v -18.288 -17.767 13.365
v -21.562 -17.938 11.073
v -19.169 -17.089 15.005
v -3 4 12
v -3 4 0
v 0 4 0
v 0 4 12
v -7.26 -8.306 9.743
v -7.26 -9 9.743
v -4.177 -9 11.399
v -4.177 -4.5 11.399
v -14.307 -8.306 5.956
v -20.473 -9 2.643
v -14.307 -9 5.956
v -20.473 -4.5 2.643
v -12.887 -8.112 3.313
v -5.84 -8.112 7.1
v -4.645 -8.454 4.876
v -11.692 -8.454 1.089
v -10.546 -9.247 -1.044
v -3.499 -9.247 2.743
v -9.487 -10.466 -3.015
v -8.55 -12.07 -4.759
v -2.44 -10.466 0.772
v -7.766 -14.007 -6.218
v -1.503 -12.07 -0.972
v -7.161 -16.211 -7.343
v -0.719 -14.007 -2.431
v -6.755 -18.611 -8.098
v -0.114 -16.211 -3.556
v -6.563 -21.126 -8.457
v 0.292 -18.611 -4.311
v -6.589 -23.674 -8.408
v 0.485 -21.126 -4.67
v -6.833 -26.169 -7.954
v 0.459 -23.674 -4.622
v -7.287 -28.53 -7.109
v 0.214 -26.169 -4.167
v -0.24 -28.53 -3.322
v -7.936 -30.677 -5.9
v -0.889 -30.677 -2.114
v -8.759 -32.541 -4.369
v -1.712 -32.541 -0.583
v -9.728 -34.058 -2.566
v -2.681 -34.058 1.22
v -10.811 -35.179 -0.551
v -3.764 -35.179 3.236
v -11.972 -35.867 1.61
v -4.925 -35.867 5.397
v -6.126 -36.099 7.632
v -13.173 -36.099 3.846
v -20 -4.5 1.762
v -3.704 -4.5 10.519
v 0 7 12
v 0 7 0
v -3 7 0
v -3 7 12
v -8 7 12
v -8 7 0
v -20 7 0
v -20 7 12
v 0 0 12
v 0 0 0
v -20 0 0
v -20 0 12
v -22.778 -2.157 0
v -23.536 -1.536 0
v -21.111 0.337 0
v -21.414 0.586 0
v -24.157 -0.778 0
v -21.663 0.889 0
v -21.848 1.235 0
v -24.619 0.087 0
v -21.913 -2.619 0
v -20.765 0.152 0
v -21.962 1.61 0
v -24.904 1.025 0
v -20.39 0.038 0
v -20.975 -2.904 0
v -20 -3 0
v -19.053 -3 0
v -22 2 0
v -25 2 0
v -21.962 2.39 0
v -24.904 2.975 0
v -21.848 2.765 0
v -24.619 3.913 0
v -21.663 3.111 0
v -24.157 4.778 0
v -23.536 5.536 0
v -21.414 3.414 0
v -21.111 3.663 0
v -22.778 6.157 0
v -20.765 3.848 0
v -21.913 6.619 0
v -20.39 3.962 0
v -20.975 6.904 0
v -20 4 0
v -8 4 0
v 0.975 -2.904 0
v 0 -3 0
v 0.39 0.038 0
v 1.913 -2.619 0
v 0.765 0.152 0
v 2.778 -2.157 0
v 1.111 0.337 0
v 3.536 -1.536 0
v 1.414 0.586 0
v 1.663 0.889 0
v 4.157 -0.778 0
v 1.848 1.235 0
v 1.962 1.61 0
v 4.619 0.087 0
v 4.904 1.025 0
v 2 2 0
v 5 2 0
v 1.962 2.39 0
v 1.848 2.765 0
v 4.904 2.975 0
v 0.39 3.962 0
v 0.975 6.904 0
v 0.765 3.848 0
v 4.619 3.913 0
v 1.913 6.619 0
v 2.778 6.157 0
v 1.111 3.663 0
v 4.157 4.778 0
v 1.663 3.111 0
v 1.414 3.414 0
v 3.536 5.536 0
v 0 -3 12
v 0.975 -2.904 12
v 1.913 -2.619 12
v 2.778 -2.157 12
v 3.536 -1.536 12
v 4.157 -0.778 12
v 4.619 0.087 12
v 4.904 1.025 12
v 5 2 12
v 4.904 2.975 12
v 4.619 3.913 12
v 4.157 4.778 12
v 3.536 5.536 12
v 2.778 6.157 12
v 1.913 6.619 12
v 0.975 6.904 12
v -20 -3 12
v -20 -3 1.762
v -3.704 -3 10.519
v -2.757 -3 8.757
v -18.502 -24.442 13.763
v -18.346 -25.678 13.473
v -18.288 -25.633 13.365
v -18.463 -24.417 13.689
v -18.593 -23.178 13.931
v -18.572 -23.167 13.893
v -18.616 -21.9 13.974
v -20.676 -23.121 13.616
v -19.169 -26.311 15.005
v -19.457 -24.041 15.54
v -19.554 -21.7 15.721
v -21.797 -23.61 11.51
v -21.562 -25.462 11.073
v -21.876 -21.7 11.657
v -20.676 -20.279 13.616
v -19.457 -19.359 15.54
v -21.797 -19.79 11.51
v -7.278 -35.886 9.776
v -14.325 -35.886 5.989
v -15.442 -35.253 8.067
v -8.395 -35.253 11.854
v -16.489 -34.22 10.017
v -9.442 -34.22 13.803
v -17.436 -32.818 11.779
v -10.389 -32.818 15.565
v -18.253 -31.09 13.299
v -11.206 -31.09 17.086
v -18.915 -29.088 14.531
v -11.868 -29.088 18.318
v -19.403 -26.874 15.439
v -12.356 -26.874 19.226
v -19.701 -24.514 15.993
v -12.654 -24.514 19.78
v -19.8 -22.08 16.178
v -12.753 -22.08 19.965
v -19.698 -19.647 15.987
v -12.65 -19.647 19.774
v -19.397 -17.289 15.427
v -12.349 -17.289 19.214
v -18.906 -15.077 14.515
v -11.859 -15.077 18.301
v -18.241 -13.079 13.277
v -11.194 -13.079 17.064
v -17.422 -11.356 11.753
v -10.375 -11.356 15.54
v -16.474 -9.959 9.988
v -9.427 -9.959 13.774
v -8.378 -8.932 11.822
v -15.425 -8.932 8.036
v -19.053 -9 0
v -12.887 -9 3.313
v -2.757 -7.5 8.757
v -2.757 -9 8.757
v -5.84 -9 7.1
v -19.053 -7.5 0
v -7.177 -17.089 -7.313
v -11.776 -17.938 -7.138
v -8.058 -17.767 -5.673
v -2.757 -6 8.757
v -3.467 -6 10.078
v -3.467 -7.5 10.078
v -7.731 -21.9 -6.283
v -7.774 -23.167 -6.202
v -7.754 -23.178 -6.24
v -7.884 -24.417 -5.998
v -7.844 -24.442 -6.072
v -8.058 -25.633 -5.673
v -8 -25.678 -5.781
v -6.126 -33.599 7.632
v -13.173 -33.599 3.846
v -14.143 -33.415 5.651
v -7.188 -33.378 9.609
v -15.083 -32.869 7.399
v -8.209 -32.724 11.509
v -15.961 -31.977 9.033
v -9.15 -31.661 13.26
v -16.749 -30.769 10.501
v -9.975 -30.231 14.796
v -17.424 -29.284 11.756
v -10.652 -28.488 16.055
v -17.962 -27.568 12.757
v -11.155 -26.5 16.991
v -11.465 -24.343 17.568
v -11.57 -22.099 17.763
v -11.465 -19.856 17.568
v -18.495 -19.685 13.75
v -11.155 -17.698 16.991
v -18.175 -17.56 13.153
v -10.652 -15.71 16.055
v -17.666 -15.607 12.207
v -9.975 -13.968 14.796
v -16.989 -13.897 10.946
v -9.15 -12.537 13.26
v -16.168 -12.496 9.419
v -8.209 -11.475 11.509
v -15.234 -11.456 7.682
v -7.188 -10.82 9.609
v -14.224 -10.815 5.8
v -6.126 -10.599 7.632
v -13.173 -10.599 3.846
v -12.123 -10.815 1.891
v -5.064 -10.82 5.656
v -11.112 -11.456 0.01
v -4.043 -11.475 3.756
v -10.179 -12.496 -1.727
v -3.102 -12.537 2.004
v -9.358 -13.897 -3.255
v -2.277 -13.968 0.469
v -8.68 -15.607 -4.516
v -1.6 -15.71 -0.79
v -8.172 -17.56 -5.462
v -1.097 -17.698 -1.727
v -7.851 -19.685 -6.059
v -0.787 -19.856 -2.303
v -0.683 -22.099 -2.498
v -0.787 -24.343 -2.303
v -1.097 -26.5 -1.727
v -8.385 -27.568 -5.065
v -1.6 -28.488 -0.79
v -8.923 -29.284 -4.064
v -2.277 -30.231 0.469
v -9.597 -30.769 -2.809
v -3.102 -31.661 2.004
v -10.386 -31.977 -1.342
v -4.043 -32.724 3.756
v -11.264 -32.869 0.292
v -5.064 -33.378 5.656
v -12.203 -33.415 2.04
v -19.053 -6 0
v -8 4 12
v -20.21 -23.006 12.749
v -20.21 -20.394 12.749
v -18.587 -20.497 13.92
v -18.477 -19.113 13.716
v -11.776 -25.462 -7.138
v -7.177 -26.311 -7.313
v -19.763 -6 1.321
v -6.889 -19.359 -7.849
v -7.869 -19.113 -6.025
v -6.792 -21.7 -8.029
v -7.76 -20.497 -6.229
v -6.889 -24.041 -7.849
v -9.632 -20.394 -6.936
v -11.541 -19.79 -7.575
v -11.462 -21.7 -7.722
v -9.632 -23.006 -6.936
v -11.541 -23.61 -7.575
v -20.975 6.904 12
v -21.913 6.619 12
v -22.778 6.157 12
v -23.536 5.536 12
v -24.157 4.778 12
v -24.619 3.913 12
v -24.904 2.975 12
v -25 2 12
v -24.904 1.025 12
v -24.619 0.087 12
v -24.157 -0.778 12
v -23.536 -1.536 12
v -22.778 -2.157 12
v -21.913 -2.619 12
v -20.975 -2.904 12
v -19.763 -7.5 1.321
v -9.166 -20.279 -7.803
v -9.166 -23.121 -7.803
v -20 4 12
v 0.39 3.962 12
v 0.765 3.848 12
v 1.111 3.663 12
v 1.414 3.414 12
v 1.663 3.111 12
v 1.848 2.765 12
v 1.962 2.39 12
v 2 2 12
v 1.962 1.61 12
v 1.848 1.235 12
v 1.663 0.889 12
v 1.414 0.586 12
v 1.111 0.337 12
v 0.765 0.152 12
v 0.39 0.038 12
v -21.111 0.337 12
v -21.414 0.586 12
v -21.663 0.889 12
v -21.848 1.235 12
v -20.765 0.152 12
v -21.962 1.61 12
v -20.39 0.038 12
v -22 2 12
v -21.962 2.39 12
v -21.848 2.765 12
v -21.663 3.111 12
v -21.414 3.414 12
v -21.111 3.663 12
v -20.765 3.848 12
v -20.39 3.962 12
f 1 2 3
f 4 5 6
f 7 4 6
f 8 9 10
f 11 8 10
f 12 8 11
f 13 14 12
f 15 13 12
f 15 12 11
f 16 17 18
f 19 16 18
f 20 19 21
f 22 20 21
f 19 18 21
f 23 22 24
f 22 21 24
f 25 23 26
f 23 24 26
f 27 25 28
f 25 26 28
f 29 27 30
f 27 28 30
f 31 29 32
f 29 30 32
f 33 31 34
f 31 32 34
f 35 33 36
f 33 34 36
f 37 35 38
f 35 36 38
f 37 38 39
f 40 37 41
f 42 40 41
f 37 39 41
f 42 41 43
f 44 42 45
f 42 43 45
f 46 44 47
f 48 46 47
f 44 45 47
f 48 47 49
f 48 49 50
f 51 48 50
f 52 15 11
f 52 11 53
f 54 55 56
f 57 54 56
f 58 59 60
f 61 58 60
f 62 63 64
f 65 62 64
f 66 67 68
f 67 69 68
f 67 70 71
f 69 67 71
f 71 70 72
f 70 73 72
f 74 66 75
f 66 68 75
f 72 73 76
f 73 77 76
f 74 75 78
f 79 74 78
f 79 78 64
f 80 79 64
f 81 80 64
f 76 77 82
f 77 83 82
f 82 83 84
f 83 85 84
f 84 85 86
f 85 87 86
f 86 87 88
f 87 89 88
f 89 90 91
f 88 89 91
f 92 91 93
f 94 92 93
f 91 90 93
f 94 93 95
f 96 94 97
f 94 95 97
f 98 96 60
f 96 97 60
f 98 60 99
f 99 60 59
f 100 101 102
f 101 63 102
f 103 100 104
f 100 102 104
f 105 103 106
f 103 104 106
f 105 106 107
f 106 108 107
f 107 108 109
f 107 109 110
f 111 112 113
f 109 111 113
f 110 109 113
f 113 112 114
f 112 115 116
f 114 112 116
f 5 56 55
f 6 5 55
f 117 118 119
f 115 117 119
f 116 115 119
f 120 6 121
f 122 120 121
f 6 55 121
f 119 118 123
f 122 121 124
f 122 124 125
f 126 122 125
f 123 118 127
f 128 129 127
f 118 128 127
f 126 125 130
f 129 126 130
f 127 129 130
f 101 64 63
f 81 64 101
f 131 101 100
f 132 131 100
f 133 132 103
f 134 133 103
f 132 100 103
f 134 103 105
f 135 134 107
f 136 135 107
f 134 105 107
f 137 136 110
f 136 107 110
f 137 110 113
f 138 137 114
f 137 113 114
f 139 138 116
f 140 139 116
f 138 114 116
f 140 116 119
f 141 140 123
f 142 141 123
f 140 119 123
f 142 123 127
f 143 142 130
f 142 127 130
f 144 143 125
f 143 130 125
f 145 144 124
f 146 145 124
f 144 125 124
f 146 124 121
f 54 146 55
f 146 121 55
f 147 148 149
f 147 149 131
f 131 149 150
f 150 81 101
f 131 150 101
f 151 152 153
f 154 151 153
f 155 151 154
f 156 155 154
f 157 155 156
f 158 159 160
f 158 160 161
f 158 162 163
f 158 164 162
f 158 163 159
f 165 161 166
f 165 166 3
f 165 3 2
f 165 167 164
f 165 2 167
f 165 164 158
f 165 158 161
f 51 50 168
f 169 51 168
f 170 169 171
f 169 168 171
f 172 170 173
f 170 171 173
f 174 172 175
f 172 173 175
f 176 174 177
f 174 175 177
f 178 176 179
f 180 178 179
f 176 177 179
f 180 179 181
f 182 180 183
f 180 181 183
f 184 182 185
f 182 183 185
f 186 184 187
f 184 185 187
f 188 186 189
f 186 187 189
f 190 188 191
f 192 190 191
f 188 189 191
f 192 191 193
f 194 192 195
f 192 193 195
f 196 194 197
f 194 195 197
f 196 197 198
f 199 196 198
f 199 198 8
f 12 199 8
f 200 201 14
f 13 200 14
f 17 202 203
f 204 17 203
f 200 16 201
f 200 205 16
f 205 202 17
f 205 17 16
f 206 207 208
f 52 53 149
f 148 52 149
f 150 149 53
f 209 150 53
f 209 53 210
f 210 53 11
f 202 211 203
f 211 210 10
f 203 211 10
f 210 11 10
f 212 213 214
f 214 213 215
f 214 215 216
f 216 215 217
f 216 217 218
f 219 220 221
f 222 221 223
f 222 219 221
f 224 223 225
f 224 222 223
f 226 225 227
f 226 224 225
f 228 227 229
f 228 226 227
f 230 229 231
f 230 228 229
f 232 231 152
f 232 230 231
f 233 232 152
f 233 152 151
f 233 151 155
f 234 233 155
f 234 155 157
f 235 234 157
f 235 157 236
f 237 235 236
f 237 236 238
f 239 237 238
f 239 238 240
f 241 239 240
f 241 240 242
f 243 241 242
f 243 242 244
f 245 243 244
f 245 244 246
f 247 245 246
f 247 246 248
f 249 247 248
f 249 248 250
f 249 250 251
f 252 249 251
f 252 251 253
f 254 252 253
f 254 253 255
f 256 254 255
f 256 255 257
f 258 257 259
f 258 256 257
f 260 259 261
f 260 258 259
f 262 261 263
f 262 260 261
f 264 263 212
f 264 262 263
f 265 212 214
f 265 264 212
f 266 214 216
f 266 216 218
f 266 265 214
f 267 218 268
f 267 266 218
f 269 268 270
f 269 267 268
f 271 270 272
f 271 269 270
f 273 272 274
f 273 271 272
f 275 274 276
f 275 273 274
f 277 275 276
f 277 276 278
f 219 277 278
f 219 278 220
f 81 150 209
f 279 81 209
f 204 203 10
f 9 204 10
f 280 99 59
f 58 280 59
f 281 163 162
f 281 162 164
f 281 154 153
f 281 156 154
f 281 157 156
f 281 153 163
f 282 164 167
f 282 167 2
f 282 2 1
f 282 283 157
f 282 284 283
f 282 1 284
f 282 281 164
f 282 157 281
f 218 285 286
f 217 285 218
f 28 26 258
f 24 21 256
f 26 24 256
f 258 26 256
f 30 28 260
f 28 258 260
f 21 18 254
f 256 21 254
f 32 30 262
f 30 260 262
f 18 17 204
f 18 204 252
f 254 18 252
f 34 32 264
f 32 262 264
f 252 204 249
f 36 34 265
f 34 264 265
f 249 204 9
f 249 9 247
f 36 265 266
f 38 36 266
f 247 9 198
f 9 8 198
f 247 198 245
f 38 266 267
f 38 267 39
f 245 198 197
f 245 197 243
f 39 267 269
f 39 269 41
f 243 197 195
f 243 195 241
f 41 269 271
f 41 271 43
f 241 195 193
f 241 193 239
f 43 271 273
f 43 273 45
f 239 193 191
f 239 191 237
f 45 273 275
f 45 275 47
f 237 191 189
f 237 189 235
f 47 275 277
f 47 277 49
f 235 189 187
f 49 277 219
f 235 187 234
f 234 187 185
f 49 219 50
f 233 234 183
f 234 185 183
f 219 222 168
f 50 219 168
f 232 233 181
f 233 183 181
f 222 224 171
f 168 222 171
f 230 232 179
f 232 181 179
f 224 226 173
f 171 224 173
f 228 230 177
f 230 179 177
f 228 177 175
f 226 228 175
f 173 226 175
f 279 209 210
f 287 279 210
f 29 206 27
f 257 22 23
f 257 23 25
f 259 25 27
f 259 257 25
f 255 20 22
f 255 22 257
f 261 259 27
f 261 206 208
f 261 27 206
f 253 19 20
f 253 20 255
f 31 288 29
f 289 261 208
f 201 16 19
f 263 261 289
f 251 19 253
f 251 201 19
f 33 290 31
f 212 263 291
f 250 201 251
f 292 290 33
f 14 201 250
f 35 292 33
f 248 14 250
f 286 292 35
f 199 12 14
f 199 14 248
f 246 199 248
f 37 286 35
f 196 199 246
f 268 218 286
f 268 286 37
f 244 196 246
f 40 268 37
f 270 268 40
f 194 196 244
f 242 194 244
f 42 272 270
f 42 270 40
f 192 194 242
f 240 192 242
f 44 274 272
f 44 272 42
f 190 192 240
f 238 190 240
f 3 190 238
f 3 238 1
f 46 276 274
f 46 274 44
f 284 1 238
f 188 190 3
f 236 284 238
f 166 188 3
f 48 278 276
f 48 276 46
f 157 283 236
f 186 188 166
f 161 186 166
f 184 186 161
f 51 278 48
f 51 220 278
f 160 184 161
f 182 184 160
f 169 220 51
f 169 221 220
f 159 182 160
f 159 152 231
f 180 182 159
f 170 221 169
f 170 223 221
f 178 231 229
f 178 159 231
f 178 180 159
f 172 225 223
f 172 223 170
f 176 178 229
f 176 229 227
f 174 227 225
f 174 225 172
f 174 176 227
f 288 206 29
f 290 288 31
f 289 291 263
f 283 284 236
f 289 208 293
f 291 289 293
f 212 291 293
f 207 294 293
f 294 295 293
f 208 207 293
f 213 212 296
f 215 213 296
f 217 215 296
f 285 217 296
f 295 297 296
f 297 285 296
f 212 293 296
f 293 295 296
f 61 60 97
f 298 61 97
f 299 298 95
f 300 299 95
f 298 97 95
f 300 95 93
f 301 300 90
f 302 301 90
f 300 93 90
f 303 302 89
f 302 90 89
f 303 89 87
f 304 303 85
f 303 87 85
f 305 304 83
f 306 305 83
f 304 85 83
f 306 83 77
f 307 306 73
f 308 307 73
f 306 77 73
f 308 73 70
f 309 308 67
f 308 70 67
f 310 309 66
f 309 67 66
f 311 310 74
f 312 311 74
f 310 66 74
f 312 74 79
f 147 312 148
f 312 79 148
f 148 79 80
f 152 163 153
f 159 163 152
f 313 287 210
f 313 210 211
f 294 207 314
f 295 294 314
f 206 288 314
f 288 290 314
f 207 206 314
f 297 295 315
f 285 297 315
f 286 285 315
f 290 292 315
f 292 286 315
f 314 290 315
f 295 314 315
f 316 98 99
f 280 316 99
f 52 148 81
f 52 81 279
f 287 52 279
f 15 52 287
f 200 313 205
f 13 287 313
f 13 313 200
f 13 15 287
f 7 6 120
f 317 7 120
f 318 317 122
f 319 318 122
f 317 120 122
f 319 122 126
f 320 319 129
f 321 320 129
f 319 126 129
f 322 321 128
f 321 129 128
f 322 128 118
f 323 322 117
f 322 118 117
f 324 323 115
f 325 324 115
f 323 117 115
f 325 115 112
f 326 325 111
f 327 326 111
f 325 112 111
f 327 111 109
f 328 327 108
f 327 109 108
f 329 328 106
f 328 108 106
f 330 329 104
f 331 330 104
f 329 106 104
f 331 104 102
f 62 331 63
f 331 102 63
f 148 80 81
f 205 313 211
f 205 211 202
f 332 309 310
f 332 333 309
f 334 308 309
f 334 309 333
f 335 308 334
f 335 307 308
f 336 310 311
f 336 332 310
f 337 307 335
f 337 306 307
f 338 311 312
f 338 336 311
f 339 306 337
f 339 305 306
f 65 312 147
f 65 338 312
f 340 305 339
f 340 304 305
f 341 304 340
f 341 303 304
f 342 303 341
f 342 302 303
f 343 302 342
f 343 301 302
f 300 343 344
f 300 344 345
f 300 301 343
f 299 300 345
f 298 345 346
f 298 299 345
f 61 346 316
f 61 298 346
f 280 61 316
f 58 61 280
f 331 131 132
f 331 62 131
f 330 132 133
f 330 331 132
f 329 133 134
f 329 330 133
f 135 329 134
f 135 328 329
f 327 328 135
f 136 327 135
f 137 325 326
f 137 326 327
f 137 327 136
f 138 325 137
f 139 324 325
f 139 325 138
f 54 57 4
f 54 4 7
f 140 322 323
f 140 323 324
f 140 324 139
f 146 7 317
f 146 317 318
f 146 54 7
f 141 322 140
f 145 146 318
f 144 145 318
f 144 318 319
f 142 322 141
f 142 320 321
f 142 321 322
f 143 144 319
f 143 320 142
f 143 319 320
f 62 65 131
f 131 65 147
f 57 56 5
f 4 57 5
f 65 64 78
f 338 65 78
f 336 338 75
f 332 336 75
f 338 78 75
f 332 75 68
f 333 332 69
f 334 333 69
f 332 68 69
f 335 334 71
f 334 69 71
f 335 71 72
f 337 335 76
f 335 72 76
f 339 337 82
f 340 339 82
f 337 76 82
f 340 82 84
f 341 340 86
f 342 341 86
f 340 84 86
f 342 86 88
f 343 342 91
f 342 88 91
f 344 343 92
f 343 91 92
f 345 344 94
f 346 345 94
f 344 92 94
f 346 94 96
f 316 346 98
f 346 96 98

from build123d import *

# Parameters (mm, degrees)
F1_DEPTH       = 12
F5_DEPTH       = 18.5
F7_R           = 11.5
F8_DEPTH       = 8
F11_ANGLE_BACK = 20
F11_ANGLE      = 40


with BuildPart() as f1:
    # F0 (on Top) → F1 (new body)
    with BuildSketch(Plane.XY):
        with BuildLine():
            Line((0, 0), (-20, 0))
            ThreePointArc((-20, 0), (-22, 2), (-20, 4))
            Line((-20, 4), (-8, 4))
            Line((-8, 4), (-8, 7))
            Line((-8, 7), (-20, 7))
            ThreePointArc((-20, 7), (-25, 2), (-20, -3))
            Line((-20, -3), (0, -3))
            ThreePointArc((0, -3), (5, 2), (0, 7))
            Line((0, 7), (-3, 7))
            Line((-3, 7), (-3, 4))
            Line((-3, 4), (0, 4))
            ThreePointArc((0, 4), (2, 2), (0, 0))
        make_face()
    extrude(amount=F1_DEPTH)

    # F4 (on line) → F5 (join)
    with BuildSketch(Plane(origin=(-14.7844431916, 0, -7.9443702008), x_dir=(0, -1, 0), z_dir=(-0.8808807435, 0, -0.4733382677))):
        Polygon((3, 11.0186671228), (3, 9.0186671228), (6, 9.0186671228), (6, 10.5186671228), (7.5, 10.5186671228), (7.5, 9.0186671228), (9, 9.0186671228), (9, 12.0186671228), (4.5, 12.0186671228), (4.5, 11.0186671228), align=None)
    extrude(amount=-F5_DEPTH)

    # F7 (on offset) → F8 (join)
    with BuildSketch(Plane(origin=(-1.5712320387, 0, -0.8442961852), x_dir=(0, -1, 0), z_dir=(-0.8808807435, 0, -0.4733382677))):
        with BuildLine():
            ThreePointArc((36.0992396533, 9.6230288318), (24.609219733, 23.3961911411), (8.9992396533, 14.5616521217))
            Line((8.9992396533, 14.5616521217), (8.9992396533, 4.6844055418))
            ThreePointArc((8.9992396533, 4.6844055418), (24.609219733, -4.1501334776), (36.0992396533, 9.6230288318))
        make_face()
        with Locations((22.0992396533, 9.6230288318)):
            Circle(F7_R, mode=Mode.SUBTRACT)
        with BuildLine():
            Line((8.9992396533, 4.6844055418), (8.9992396533, 14.5616521217))
            ThreePointArc((8.9992396533, 14.5616521217), (8.0992396533, 9.6230288318), (8.9992396533, 4.6844055418))
        make_face()
    extrude(amount=F8_DEPTH)

    # F10 (on offset) → F11 (revolve)
    with BuildSketch(Plane.XZ.offset(21.7), mode=Mode.PRIVATE) as f11_sk:
        Polygon((-6.7922217721, -8.029286104), (-7.7298357056, -6.2843900851), (-11.4623919126, -7.7224527269), align=None)
        Polygon((-21.8758338022, 11.6569236308), (-18.6166158629, 13.9758670161), (-19.5542297964, 15.720763035), align=None)
    revolve(f11_sk.sketch.rotate(Axis((-15.3602525801, -21.7, 2.6705470646), (-0.8808807435, 0, -0.4733382677)), -F11_ANGLE_BACK), axis=Axis((-15.3602525801, -21.7, 2.6705470646), (-0.8808807435, 0, -0.4733382677)), revolution_arc=F11_ANGLE)


solid = f1.part
